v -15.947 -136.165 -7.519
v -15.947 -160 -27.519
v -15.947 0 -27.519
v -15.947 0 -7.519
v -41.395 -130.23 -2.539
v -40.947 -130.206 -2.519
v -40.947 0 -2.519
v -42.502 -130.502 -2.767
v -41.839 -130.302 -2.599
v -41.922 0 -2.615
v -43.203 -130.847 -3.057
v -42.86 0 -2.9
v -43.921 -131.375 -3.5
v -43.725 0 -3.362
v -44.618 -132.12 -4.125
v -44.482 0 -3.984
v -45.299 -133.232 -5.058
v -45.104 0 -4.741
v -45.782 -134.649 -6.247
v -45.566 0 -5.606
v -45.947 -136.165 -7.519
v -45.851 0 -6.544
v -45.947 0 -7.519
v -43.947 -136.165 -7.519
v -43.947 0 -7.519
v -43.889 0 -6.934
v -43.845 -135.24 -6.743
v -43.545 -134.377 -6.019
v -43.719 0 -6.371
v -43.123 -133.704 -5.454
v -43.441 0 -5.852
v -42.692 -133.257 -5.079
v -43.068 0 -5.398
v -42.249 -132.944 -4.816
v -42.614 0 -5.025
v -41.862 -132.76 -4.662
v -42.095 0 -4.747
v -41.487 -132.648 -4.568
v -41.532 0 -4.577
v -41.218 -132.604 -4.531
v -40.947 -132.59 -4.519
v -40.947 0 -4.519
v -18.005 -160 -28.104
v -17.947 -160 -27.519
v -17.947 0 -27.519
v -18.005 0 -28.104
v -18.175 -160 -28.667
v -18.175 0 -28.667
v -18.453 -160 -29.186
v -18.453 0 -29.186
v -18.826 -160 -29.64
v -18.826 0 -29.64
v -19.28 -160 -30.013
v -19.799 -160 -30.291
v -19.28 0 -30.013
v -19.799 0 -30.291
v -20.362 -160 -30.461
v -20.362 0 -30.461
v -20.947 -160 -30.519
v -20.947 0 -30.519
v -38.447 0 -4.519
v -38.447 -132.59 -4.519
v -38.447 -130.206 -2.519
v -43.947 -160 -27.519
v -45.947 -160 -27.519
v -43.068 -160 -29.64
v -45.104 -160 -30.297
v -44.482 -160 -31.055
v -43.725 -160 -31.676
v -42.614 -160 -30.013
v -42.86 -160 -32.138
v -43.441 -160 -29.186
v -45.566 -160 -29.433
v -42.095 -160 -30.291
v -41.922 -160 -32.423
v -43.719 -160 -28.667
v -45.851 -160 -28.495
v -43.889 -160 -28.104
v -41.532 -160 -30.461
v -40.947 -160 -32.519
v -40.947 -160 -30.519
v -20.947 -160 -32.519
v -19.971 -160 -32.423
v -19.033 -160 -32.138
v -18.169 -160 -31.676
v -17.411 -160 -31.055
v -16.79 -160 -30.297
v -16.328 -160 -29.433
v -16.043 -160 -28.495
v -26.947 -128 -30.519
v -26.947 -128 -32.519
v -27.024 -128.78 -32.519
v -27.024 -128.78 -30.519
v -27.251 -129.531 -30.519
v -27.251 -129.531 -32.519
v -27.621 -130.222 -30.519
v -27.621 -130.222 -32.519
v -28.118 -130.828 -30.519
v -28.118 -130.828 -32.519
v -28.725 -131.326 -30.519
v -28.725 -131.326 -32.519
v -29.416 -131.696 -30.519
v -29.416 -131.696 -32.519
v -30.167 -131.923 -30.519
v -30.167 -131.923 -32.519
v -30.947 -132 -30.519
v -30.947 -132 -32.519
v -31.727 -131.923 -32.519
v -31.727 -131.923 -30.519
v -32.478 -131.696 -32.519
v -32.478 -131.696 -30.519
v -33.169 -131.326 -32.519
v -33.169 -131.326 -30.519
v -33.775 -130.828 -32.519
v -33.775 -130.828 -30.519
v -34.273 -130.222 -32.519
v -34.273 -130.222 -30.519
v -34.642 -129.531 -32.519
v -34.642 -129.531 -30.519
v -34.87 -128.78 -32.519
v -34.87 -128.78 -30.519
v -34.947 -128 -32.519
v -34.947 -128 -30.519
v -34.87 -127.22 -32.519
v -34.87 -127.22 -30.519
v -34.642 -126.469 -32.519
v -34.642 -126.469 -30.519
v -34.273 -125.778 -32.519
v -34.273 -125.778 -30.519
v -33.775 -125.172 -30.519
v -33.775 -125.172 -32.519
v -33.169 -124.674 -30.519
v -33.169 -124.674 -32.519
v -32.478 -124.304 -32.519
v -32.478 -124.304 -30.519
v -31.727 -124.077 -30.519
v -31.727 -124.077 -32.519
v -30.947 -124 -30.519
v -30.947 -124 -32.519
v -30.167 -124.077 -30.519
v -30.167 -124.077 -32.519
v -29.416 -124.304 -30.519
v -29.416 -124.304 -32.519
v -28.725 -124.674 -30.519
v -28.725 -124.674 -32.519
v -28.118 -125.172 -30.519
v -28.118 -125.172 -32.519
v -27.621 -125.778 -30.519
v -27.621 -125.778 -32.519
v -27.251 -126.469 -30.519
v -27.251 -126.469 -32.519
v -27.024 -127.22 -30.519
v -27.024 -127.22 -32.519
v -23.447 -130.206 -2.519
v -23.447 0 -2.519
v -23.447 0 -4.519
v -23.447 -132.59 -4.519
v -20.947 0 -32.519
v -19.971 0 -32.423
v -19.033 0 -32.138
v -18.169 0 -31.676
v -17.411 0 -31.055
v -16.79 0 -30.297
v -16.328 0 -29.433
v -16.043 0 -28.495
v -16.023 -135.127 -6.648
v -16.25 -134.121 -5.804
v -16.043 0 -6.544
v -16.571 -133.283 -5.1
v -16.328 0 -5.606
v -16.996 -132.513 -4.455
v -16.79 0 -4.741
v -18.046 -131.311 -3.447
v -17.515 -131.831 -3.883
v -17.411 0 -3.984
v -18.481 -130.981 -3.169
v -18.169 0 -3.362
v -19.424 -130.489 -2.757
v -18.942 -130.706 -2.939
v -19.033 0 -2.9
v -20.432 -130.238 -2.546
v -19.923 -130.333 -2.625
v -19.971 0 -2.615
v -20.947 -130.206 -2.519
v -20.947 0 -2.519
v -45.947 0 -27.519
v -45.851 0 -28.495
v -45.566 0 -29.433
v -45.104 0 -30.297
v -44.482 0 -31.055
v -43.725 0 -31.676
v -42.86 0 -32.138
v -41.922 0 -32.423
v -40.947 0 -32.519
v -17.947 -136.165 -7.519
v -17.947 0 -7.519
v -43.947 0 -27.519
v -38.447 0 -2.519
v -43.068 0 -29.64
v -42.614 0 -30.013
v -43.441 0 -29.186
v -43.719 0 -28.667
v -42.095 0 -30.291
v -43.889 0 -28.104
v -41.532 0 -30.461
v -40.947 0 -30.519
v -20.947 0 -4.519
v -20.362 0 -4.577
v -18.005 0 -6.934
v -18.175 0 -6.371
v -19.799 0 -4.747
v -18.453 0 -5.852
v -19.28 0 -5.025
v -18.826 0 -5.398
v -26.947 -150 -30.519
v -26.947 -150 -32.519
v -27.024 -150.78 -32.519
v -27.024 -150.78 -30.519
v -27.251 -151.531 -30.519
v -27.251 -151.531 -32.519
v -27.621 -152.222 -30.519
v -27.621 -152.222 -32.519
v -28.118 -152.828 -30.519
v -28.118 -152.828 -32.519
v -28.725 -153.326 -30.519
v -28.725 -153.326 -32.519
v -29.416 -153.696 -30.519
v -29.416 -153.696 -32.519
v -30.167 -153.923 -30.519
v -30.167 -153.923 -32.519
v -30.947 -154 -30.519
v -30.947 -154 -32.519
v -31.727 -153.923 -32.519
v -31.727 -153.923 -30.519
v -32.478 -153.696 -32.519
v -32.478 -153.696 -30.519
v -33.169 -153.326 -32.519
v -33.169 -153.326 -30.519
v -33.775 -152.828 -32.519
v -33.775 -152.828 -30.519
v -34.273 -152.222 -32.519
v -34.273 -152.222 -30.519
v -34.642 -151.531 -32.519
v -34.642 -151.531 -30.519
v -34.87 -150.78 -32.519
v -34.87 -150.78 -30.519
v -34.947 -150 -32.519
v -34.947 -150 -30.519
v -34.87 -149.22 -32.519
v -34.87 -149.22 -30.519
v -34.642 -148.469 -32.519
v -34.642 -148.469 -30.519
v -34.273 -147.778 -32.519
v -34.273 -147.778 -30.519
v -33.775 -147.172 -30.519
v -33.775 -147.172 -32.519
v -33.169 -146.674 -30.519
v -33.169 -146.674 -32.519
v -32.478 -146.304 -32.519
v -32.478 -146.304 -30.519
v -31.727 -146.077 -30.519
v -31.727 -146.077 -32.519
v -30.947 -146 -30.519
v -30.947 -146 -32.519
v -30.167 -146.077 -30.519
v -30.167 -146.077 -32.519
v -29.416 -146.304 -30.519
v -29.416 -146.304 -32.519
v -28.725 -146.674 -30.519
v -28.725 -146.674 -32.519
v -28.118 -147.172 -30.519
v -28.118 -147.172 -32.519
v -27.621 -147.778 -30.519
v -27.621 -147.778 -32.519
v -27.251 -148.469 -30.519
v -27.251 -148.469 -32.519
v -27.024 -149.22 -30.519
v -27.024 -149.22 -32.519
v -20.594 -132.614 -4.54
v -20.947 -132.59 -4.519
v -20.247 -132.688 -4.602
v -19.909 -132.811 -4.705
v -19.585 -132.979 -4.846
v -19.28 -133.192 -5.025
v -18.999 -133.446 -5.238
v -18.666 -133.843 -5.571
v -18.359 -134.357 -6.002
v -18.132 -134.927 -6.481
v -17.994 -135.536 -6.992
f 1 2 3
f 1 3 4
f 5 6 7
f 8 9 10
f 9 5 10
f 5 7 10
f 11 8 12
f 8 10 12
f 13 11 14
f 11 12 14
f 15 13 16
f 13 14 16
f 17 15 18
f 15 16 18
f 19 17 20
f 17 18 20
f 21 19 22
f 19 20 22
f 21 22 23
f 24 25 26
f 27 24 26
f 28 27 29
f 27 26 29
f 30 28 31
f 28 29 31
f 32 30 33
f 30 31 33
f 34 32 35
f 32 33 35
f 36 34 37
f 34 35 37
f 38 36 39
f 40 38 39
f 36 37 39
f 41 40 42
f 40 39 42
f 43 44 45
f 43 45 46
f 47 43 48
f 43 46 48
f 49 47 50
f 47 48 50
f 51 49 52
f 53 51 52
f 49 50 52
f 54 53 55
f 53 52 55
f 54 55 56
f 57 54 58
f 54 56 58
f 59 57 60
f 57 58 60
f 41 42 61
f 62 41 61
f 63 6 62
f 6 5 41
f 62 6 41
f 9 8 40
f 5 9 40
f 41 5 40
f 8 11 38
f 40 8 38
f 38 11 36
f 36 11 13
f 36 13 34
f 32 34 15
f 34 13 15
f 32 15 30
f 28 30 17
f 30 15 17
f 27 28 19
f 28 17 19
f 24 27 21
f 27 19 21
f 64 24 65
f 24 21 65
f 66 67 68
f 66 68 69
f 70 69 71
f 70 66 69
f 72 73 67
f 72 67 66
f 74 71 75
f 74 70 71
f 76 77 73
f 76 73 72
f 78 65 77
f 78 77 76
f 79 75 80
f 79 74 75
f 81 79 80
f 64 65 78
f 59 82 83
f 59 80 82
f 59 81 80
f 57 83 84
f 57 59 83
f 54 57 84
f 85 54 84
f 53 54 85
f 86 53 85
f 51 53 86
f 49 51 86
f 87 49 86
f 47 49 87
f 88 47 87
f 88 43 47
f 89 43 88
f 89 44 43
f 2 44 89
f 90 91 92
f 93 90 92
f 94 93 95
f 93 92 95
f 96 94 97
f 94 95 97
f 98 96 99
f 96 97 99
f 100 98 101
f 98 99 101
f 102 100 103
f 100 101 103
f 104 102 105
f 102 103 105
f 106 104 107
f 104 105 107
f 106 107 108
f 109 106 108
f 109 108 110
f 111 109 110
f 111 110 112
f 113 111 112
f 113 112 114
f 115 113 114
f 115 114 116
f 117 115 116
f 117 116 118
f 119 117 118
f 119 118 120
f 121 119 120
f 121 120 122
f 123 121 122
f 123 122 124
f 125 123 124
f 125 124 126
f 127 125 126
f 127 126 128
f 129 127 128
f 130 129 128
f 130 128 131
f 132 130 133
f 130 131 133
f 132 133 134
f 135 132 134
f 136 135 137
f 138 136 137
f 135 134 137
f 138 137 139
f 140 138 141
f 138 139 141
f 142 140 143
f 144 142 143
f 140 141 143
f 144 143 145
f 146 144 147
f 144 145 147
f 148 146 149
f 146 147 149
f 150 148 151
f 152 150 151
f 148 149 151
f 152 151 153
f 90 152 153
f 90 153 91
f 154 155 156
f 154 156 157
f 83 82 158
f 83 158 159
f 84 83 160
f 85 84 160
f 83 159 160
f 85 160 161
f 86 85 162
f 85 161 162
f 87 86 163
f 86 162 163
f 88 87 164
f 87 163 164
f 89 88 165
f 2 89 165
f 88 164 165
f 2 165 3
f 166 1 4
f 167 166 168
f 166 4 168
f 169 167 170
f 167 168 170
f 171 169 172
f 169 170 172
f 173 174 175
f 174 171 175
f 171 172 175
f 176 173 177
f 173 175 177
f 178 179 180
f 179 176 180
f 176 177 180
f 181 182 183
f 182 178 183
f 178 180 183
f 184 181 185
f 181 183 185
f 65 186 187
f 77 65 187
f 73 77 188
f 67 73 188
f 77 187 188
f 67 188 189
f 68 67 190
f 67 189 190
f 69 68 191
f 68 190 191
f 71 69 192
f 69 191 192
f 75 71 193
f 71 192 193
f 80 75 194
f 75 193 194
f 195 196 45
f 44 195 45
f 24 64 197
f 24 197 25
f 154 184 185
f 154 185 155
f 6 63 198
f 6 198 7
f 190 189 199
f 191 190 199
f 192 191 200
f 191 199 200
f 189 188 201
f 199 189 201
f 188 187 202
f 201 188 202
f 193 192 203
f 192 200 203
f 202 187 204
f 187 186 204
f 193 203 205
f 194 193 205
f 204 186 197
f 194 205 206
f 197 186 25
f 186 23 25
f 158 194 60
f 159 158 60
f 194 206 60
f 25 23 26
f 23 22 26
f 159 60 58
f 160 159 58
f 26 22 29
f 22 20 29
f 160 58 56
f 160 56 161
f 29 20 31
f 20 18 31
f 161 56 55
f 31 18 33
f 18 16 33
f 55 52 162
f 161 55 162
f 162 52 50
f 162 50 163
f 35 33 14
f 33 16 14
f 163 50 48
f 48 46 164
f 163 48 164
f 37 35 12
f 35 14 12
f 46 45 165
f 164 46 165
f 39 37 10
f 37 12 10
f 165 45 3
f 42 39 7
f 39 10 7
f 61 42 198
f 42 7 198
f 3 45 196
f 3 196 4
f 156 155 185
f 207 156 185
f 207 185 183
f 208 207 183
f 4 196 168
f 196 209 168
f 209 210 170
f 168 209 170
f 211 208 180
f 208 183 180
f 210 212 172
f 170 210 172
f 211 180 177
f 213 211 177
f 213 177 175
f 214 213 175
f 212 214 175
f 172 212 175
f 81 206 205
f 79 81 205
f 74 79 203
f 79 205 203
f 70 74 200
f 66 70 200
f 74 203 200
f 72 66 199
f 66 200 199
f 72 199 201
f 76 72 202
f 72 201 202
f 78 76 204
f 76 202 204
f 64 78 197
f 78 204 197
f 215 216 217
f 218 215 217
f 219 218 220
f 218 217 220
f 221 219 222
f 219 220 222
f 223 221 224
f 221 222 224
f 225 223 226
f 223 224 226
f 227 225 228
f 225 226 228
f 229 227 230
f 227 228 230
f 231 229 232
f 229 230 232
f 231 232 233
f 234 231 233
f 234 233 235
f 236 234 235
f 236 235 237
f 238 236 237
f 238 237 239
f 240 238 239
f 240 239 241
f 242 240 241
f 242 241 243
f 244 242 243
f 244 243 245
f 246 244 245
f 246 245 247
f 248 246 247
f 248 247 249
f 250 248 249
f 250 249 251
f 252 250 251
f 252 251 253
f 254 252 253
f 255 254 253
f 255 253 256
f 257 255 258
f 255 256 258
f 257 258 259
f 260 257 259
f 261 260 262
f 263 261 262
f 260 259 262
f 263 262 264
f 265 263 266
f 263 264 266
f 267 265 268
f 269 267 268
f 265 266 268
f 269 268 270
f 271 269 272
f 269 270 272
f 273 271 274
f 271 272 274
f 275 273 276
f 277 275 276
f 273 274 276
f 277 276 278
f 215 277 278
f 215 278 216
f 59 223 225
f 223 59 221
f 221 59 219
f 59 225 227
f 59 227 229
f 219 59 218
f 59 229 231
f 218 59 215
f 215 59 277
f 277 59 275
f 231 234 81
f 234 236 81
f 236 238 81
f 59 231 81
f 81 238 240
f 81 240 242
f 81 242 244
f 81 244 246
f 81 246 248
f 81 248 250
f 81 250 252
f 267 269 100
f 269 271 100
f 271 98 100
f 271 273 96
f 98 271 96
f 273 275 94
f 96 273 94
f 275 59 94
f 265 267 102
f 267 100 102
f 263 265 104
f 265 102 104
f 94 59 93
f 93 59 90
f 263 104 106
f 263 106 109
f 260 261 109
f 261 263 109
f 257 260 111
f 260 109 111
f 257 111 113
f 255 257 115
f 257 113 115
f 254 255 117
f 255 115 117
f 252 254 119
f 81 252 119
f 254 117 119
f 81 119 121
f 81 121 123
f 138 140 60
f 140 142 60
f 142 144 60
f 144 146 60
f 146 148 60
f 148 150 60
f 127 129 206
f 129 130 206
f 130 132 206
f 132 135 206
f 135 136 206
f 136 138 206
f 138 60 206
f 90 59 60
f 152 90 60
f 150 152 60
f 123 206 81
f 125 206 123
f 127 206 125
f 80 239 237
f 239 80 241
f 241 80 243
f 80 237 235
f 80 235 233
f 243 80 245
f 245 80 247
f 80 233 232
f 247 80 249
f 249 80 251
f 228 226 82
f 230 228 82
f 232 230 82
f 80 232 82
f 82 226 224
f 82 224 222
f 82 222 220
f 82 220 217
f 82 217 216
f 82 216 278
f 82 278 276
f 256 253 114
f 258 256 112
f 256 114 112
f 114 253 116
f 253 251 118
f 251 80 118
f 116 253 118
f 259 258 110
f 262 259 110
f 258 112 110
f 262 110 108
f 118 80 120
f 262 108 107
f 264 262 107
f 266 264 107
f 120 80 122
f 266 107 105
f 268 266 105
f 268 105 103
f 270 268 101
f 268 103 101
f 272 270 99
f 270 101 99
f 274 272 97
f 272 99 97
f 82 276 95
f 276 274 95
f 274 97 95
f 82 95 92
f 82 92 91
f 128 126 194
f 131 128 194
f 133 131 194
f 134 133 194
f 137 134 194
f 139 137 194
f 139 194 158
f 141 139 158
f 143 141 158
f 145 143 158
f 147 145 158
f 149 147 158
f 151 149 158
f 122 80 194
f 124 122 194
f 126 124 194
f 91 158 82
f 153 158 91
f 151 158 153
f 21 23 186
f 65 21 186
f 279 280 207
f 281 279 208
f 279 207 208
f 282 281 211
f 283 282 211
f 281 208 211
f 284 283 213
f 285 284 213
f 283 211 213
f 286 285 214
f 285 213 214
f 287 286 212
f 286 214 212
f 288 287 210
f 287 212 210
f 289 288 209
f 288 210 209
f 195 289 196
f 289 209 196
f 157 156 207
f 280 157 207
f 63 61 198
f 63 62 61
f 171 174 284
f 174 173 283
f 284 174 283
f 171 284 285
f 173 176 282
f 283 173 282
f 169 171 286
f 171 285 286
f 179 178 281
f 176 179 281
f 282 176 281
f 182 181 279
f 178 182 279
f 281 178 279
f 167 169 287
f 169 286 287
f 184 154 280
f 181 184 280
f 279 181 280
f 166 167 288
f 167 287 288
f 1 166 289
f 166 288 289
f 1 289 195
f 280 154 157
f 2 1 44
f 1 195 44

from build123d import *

# Parameters (mm, degrees)
F1_DEPTH = 160
F3_DEPTH = 32
F4_R     = 4
F5_DEPTH = 25


with BuildPart() as f1:
    # F0 (on Front) → F1 (new body)
    with BuildSketch(Plane.XZ):
        with BuildLine():
            ThreePointArc((-15.946916, -7.519089), (-17.411383, -3.983555), (-20.946916, -2.519089))
            Line((-20.946916, -2.519089), (-23.446916, -2.519089))
            Line((-23.446916, -2.519089), (-23.446916, -4.519089))
            Line((-23.446916, -4.519089), (-20.946916, -4.519089))
            ThreePointArc((-20.946916, -4.519089), (-18.825596, -5.397769), (-17.946916, -7.519089))
            Line((-17.946916, -7.519089), (-17.946916, -27.519089))
            ThreePointArc((-17.946916, -27.519089), (-18.825596, -29.640409), (-20.946916, -30.519089))
            Line((-20.946916, -30.519089), (-40.946916, -30.519089))
            ThreePointArc((-40.946916, -30.519089), (-43.068237, -29.640409), (-43.946916, -27.519089))
            Line((-43.946916, -27.519089), (-43.946916, -7.519089))
            ThreePointArc((-43.946916, -7.519089), (-43.068237, -5.397769), (-40.946916, -4.519089))
            Line((-40.946916, -4.519089), (-38.446916, -4.519089))
            Line((-38.446916, -4.519089), (-38.446916, -2.519089))
            Line((-38.446916, -2.519089), (-40.946916, -2.519089))
            ThreePointArc((-40.946916, -2.519089), (-44.48245, -3.983555), (-45.946916, -7.519089))
            Line((-45.946916, -7.519089), (-45.946916, -27.519089))
            ThreePointArc((-45.946916, -27.519089), (-44.48245, -31.054623), (-40.946916, -32.519089))
            Line((-40.946916, -32.519089), (-20.946916, -32.519089))
            ThreePointArc((-20.946916, -32.519089), (-17.411383, -31.054623), (-15.946916, -27.519089))
            Line((-15.946916, -27.519089), (-15.946916, -7.519089))
        make_face()
    extrude(amount=F1_DEPTH)

    # F2 (on face) → F3 (cut)
    with BuildSketch(Plane(origin=(-45.946916, 0, 0), x_dir=(0, -1, 0), z_dir=(-1, 0, 0))):
        Polygon((121.249738, 4.996242), (160, -27.519089), (160, 4.996242), align=None)
    extrude(amount=-F3_DEPTH, mode=Mode.SUBTRACT)

    # F4 (on face) → F5 (cut)
    with BuildSketch(Plane(origin=(0, 0, -32.519089), x_dir=(1, 0, 0), z_dir=(0, 0, -1))):
        with Locations((-30.946916, 150)):
            Circle(F4_R)
        with Locations((-30.946916, 128)):
            Circle(F4_R)
    extrude(amount=-F5_DEPTH, mode=Mode.SUBTRACT)


solid = f1.part
